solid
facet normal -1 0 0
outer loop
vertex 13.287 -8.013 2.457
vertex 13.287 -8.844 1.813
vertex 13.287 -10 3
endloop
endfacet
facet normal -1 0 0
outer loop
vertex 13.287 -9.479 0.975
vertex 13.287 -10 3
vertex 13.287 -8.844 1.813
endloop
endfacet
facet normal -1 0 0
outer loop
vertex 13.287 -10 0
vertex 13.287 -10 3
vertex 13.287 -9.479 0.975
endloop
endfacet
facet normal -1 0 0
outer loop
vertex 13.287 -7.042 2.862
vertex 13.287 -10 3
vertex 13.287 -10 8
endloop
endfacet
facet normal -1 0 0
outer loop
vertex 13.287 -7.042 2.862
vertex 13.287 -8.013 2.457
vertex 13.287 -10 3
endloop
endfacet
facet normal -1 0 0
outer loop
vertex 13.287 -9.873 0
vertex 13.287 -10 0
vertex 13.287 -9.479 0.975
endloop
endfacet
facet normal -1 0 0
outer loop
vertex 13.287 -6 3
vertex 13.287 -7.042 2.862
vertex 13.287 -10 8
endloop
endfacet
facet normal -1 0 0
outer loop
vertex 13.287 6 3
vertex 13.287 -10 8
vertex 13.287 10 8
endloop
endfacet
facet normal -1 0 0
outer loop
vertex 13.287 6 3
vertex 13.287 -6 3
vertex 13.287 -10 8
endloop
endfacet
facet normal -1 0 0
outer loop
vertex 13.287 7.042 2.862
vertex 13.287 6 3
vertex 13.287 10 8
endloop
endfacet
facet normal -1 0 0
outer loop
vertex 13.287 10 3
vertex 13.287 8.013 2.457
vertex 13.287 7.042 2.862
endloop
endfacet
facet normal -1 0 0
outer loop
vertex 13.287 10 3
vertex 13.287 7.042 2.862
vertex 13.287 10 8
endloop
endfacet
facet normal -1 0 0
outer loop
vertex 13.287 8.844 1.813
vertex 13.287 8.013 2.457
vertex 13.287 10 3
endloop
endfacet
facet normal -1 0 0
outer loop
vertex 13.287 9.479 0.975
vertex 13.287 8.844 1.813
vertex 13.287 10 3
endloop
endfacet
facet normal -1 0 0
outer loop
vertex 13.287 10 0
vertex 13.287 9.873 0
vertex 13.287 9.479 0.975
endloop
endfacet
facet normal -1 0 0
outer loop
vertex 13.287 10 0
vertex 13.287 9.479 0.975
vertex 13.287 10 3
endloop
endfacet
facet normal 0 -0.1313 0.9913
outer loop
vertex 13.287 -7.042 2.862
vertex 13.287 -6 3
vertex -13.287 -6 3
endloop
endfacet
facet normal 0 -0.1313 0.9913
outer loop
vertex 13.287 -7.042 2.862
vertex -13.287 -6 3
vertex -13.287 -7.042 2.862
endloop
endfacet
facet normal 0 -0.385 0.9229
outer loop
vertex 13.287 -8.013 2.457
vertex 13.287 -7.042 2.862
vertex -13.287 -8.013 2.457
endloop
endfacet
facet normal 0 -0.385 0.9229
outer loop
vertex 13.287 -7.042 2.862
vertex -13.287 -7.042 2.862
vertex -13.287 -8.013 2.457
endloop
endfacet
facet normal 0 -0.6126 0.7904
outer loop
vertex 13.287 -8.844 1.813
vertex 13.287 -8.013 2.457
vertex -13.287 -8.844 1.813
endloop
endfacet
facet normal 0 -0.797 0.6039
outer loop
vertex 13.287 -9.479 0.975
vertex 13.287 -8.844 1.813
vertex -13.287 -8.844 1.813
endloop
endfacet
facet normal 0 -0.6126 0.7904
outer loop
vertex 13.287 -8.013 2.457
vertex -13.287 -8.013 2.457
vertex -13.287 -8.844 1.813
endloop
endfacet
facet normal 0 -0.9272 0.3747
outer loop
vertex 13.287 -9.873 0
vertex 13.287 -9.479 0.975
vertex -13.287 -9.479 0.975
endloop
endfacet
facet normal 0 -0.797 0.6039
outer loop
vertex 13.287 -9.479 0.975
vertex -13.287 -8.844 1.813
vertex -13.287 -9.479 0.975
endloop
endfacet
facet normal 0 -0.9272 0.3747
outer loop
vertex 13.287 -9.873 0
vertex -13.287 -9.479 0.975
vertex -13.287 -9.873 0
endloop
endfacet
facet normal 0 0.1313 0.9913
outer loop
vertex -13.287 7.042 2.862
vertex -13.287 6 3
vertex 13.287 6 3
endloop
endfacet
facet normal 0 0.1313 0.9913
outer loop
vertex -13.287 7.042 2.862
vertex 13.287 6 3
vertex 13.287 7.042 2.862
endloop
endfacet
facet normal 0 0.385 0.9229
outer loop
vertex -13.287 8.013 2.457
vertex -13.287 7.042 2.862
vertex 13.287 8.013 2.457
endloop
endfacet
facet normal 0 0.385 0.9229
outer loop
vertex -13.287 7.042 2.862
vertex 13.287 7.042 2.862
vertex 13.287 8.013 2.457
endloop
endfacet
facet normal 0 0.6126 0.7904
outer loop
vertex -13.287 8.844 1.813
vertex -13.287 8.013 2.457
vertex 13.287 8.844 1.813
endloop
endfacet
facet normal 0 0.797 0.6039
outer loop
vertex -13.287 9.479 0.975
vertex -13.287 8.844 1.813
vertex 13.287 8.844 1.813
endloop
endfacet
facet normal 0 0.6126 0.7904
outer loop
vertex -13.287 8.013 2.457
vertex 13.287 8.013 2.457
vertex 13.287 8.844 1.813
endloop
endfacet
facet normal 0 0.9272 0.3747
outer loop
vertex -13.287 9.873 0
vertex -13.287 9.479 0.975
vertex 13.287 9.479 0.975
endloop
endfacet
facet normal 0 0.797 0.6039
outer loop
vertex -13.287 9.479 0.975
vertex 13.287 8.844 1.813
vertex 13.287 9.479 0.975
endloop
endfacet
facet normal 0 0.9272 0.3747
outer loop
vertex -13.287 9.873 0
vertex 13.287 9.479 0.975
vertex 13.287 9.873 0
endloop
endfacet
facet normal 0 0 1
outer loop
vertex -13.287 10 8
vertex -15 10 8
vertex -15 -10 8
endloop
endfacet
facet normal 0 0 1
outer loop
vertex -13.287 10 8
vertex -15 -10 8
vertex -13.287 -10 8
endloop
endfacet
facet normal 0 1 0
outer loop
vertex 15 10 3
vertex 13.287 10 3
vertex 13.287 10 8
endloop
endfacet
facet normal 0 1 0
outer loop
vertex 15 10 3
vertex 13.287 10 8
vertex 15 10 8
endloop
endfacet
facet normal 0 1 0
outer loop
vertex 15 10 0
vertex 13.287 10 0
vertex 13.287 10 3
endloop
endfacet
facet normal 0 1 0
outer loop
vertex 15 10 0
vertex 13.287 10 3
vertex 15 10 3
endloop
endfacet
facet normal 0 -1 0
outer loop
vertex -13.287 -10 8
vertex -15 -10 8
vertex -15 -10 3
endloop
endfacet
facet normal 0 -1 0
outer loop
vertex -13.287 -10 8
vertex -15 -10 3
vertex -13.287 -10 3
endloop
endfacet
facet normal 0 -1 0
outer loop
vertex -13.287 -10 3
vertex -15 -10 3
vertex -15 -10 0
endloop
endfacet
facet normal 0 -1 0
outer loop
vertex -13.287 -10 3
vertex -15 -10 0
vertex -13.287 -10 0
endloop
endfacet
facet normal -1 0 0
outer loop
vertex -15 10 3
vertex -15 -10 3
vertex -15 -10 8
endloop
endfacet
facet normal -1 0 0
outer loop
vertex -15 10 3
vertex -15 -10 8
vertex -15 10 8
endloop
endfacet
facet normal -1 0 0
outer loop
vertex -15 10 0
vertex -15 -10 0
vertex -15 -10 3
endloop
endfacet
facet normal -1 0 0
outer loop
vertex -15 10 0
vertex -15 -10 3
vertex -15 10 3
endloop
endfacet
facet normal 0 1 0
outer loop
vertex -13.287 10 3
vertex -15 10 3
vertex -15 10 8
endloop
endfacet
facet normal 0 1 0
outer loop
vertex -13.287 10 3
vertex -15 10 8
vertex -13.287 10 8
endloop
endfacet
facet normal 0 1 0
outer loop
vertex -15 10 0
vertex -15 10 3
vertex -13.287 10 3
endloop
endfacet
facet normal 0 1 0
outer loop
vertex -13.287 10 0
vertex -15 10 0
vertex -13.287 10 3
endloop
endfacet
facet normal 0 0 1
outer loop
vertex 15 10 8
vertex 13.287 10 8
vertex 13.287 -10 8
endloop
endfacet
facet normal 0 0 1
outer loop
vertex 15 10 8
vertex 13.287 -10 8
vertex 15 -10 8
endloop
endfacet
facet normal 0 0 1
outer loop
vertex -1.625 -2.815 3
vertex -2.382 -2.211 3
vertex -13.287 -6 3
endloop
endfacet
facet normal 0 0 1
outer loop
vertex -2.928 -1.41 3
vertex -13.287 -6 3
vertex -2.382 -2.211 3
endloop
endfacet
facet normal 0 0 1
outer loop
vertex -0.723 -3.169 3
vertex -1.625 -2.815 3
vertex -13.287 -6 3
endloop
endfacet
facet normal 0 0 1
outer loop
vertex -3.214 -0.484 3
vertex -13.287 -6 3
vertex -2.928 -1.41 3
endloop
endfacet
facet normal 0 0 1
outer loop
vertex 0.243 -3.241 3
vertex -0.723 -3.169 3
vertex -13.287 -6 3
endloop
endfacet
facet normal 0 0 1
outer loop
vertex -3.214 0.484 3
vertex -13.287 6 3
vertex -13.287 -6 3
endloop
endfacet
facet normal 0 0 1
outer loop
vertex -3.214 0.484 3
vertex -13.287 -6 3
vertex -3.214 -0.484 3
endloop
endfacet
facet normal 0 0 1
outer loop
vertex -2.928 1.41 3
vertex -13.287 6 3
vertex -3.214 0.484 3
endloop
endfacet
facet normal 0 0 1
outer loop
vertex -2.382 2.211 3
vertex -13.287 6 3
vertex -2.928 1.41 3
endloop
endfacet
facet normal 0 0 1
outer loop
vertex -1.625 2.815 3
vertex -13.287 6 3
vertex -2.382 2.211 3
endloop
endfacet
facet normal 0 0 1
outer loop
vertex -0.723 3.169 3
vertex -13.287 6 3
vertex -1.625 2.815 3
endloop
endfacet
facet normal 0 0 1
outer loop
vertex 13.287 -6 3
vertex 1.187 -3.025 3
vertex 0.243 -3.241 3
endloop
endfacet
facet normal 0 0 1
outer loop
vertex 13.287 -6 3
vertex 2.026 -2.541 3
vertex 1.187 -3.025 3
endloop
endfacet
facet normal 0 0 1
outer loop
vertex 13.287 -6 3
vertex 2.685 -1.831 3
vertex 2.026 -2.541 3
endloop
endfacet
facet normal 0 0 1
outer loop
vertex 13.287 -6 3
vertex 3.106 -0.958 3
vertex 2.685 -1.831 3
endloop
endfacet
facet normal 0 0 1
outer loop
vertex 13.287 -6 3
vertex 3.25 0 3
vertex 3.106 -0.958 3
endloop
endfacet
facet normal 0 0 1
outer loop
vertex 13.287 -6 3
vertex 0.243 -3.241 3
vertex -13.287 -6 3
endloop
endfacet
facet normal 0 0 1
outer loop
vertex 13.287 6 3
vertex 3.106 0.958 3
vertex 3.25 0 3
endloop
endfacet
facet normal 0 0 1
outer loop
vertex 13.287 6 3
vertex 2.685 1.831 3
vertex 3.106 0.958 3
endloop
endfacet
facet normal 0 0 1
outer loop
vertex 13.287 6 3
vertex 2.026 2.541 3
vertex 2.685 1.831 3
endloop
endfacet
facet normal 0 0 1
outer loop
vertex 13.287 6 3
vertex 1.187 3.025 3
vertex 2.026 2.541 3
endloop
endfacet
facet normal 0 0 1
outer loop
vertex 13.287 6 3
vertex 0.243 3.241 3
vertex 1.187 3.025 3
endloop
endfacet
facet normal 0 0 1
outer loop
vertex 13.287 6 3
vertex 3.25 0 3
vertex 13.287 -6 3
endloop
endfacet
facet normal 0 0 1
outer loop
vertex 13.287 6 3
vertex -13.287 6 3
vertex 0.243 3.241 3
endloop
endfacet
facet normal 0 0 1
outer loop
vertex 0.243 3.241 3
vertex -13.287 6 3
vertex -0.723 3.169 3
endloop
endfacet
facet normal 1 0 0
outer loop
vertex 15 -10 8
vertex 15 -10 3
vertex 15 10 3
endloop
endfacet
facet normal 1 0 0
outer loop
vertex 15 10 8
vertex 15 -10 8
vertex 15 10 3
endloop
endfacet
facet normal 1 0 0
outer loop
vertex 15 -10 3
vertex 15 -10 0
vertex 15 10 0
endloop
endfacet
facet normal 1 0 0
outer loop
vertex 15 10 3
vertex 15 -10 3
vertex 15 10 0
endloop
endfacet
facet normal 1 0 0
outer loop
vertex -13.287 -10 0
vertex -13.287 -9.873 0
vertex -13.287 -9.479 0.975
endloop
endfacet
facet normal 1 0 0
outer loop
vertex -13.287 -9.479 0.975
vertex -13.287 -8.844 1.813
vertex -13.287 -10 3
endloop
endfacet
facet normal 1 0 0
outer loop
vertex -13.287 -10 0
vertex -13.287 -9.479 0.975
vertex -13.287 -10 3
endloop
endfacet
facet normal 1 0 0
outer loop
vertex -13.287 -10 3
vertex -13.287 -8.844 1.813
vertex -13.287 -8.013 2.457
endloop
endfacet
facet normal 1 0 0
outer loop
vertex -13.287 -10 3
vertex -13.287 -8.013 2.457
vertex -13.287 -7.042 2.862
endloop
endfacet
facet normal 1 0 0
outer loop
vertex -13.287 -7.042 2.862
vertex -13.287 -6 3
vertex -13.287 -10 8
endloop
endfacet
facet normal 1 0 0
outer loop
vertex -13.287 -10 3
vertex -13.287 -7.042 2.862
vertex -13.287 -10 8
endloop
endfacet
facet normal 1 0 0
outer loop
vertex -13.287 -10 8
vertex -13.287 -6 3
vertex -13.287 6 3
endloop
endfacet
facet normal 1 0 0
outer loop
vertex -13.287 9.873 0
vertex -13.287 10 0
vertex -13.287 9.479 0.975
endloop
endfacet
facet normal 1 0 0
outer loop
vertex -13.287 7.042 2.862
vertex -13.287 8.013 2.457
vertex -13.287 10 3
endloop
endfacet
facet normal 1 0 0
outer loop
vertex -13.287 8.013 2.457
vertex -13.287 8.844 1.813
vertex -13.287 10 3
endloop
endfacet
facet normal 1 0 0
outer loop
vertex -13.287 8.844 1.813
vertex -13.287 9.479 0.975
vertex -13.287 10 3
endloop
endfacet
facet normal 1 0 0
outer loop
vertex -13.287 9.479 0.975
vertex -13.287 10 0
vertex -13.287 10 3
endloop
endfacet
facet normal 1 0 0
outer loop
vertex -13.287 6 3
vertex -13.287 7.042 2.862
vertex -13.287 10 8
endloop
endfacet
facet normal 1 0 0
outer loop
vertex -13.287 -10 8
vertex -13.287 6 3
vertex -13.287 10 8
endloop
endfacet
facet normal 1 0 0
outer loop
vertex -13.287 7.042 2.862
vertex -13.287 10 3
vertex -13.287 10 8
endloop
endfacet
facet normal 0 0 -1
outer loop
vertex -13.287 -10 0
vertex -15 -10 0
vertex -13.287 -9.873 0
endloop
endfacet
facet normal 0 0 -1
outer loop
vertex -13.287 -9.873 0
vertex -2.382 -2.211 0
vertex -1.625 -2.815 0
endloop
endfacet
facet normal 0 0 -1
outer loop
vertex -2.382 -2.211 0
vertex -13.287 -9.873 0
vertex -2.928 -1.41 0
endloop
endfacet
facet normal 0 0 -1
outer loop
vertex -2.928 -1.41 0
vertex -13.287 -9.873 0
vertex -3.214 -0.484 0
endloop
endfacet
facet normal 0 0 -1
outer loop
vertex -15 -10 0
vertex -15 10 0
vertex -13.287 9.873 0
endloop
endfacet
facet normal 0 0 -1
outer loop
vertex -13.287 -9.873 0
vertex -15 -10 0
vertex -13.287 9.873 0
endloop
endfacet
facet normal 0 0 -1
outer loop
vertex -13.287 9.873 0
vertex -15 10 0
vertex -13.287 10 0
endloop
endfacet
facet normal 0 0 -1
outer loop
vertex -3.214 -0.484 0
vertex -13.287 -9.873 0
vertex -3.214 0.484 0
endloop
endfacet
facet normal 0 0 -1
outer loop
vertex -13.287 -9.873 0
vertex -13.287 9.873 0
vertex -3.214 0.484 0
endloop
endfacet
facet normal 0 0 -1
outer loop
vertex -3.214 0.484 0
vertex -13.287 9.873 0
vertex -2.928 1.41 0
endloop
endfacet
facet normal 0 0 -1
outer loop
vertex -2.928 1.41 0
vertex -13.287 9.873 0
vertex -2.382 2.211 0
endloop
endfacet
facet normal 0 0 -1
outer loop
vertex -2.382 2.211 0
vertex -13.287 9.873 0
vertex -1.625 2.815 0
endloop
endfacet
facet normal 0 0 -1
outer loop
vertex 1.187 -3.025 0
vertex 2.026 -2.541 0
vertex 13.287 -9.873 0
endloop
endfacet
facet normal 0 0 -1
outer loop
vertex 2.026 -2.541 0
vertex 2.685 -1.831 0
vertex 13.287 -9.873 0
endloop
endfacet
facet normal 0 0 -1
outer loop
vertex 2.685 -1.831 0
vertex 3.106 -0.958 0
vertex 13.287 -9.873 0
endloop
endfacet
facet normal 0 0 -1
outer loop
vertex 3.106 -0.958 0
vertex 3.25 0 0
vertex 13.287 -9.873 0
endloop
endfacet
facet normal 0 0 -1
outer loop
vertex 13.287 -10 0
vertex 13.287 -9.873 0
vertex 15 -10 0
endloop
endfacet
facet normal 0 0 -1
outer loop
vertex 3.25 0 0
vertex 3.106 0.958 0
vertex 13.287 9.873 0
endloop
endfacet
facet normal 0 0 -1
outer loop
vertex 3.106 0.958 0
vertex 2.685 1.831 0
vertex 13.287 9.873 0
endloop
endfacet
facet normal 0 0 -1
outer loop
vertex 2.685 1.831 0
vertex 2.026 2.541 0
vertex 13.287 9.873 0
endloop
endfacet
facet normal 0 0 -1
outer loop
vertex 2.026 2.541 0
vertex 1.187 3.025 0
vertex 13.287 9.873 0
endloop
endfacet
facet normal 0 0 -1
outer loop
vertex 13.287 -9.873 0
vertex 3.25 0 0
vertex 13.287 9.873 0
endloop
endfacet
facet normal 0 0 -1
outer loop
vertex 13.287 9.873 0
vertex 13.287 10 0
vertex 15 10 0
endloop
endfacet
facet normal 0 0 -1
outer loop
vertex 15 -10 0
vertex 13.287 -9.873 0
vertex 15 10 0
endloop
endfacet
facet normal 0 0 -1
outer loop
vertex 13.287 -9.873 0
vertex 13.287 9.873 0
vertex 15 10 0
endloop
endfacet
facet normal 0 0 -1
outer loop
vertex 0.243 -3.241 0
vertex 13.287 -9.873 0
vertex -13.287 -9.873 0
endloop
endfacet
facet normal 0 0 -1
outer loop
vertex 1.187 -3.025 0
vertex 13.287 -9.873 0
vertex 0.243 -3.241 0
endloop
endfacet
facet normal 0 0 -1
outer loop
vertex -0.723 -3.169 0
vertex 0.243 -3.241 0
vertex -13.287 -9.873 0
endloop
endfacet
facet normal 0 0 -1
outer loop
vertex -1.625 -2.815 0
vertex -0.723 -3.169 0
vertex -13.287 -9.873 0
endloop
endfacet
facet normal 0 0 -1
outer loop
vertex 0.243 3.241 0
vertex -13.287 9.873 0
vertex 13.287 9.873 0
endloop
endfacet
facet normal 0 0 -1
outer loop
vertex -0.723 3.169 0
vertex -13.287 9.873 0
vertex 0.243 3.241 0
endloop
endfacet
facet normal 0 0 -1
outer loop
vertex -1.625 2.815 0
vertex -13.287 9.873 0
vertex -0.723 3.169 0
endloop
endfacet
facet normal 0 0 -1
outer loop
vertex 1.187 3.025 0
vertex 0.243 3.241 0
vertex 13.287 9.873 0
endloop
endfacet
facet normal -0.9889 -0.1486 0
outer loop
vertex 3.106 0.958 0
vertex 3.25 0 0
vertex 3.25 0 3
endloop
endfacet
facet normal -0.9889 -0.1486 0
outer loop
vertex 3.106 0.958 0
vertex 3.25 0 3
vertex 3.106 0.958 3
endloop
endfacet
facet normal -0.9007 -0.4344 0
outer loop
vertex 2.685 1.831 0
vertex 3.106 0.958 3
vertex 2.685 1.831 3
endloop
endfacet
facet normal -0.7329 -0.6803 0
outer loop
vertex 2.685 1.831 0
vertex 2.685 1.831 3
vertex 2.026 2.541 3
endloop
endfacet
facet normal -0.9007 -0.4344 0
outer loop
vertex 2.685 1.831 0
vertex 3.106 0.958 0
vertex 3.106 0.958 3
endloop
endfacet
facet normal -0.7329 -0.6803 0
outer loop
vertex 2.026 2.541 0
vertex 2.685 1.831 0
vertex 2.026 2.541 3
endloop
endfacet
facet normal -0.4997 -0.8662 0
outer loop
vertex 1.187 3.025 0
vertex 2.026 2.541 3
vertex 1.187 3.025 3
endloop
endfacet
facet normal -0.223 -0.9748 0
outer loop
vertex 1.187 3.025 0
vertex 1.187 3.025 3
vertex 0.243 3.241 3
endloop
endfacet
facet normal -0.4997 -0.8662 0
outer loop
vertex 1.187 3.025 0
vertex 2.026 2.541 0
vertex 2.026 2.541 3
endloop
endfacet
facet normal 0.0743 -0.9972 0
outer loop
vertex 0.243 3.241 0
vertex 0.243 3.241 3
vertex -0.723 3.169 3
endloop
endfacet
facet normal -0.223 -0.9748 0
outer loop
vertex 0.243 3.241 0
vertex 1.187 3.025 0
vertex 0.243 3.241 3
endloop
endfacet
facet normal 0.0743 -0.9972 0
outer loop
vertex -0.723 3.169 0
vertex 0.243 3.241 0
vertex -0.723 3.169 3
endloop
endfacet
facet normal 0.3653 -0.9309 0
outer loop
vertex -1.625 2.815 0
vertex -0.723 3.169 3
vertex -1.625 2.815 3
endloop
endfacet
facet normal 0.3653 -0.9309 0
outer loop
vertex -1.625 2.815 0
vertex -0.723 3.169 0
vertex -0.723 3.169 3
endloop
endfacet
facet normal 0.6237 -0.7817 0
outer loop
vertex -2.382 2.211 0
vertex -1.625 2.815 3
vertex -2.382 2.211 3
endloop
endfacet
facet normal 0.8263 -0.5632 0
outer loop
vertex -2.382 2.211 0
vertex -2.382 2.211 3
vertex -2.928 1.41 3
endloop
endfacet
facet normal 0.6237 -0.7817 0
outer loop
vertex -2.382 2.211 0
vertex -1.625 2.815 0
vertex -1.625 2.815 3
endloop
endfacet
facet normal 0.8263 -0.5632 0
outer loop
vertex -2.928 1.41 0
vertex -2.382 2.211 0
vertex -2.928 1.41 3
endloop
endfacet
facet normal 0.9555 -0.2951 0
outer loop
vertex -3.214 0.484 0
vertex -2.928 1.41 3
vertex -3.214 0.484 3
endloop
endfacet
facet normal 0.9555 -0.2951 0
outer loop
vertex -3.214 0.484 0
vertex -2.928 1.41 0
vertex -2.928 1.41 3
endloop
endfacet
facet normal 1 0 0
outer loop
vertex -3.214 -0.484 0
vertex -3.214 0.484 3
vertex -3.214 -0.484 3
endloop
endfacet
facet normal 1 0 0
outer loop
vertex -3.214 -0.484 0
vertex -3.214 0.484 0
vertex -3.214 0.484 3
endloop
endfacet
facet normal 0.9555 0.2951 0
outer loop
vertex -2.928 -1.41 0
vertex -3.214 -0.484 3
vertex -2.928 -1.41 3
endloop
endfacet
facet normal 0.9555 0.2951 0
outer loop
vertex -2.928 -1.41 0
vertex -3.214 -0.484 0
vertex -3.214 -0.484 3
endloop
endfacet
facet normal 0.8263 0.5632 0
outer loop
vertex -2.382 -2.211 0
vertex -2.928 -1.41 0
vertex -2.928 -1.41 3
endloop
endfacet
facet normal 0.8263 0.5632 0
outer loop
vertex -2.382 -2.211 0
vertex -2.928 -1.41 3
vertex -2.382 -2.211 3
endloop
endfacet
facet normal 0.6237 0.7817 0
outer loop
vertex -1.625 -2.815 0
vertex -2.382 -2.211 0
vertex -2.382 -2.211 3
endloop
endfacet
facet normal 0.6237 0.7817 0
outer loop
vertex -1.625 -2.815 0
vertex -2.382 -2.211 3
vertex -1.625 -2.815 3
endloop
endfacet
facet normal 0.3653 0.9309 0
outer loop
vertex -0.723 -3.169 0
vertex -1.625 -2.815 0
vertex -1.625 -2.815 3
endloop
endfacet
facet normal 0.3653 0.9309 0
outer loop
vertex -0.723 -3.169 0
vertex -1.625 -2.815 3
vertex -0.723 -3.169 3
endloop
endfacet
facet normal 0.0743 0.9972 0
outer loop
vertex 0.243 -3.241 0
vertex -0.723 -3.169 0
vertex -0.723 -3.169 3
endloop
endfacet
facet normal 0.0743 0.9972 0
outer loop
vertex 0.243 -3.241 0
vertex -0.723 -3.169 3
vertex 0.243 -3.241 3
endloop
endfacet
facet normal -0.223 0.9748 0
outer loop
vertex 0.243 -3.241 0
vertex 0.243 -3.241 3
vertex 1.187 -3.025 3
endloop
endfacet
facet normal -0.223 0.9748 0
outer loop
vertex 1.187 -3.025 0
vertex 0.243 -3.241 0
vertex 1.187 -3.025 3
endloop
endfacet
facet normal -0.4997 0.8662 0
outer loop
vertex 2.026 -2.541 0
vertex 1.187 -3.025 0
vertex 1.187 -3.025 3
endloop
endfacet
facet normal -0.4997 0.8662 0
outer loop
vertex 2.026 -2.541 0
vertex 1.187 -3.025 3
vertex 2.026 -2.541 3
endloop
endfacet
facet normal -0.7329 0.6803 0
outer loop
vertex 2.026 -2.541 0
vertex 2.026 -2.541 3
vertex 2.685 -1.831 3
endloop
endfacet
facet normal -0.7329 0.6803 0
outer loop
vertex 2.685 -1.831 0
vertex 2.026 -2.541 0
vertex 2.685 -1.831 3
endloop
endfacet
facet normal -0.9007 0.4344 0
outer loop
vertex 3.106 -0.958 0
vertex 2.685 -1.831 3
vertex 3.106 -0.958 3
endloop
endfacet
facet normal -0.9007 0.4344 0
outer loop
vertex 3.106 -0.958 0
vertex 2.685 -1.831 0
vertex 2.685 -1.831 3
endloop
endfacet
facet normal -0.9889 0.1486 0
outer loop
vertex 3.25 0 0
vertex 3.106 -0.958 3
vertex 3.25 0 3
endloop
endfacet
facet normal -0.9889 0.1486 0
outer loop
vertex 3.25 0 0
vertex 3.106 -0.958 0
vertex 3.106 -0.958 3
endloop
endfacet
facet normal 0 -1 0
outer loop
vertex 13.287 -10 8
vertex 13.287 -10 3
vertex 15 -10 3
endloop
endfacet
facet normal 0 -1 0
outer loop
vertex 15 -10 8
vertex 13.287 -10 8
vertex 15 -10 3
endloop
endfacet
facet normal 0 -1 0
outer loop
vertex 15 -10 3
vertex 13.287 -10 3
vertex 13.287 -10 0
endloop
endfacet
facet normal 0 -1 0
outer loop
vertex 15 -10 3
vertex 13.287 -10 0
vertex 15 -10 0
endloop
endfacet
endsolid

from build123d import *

# Parameters (mm, degrees)
CROQUIS1_W              = 30
CROQUIS1_H              = 20
CROQUIS1_R              = 3.25
SALIENTE_EXTRUIR1_DEPTH = 3
CROQUIS3_W              = 1.712937005
CROQUIS3_H              = 20
SALIENTE_EXTRUIR2_DEPTH = 5
REDONDEO1_R             = 4
REDONDEO2_R             = 4


with BuildPart() as part:
    # Croquis1 → Saliente-Extruir1 (new body)
    with BuildSketch(Plane.XY):
        Rectangle(CROQUIS1_W, CROQUIS1_H)
        Circle(CROQUIS1_R, mode=Mode.SUBTRACT)
    extrude(amount=SALIENTE_EXTRUIR1_DEPTH)

    # Croquis3 → Saliente-Extruir2 (add)
    with BuildSketch(Plane.XY.offset(3)):
        with Locations((-14.143531498, 0)):
            Rectangle(CROQUIS3_W, CROQUIS3_H)
        with Locations((14.143531498, 0)):
            Rectangle(CROQUIS3_W, CROQUIS3_H)
    extrude(amount=SALIENTE_EXTRUIR2_DEPTH)

    # Redondeo1
    # the kernel refuses this fillet: 4 mm, written as the material it takes off along each edge
    with BuildSketch(Plane(origin=(13.287062995, 10, 3), x_dir=(0, 0, -1), z_dir=(-1, 0, 0))) as redondeo1_piece_1:
        with BuildLine():
            CenterArc((REDONDEO1_R, REDONDEO1_R), REDONDEO1_R, 180, 90)
            Line((0, REDONDEO1_R), (0, 0))
            Line((0, 0), (REDONDEO1_R, 0))
        make_face()
    extrude(amount=26.574125991, mode=Mode.SUBTRACT)

    # Redondeo2
    # the kernel refuses this fillet: 4 mm, written as the material it takes off along each edge
    with BuildSketch(Plane(origin=(-13.287062995, -10, 3), x_dir=(0, 0, -1), z_dir=(1, 0, 0))) as redondeo2_piece_1:
        with BuildLine():
            CenterArc((REDONDEO2_R, REDONDEO2_R), REDONDEO2_R, 180, 90)
            Line((0, REDONDEO2_R), (0, 0))
            Line((0, 0), (REDONDEO2_R, 0))
        make_face()
    extrude(amount=26.574125991, mode=Mode.SUBTRACT)


solid = part.part
